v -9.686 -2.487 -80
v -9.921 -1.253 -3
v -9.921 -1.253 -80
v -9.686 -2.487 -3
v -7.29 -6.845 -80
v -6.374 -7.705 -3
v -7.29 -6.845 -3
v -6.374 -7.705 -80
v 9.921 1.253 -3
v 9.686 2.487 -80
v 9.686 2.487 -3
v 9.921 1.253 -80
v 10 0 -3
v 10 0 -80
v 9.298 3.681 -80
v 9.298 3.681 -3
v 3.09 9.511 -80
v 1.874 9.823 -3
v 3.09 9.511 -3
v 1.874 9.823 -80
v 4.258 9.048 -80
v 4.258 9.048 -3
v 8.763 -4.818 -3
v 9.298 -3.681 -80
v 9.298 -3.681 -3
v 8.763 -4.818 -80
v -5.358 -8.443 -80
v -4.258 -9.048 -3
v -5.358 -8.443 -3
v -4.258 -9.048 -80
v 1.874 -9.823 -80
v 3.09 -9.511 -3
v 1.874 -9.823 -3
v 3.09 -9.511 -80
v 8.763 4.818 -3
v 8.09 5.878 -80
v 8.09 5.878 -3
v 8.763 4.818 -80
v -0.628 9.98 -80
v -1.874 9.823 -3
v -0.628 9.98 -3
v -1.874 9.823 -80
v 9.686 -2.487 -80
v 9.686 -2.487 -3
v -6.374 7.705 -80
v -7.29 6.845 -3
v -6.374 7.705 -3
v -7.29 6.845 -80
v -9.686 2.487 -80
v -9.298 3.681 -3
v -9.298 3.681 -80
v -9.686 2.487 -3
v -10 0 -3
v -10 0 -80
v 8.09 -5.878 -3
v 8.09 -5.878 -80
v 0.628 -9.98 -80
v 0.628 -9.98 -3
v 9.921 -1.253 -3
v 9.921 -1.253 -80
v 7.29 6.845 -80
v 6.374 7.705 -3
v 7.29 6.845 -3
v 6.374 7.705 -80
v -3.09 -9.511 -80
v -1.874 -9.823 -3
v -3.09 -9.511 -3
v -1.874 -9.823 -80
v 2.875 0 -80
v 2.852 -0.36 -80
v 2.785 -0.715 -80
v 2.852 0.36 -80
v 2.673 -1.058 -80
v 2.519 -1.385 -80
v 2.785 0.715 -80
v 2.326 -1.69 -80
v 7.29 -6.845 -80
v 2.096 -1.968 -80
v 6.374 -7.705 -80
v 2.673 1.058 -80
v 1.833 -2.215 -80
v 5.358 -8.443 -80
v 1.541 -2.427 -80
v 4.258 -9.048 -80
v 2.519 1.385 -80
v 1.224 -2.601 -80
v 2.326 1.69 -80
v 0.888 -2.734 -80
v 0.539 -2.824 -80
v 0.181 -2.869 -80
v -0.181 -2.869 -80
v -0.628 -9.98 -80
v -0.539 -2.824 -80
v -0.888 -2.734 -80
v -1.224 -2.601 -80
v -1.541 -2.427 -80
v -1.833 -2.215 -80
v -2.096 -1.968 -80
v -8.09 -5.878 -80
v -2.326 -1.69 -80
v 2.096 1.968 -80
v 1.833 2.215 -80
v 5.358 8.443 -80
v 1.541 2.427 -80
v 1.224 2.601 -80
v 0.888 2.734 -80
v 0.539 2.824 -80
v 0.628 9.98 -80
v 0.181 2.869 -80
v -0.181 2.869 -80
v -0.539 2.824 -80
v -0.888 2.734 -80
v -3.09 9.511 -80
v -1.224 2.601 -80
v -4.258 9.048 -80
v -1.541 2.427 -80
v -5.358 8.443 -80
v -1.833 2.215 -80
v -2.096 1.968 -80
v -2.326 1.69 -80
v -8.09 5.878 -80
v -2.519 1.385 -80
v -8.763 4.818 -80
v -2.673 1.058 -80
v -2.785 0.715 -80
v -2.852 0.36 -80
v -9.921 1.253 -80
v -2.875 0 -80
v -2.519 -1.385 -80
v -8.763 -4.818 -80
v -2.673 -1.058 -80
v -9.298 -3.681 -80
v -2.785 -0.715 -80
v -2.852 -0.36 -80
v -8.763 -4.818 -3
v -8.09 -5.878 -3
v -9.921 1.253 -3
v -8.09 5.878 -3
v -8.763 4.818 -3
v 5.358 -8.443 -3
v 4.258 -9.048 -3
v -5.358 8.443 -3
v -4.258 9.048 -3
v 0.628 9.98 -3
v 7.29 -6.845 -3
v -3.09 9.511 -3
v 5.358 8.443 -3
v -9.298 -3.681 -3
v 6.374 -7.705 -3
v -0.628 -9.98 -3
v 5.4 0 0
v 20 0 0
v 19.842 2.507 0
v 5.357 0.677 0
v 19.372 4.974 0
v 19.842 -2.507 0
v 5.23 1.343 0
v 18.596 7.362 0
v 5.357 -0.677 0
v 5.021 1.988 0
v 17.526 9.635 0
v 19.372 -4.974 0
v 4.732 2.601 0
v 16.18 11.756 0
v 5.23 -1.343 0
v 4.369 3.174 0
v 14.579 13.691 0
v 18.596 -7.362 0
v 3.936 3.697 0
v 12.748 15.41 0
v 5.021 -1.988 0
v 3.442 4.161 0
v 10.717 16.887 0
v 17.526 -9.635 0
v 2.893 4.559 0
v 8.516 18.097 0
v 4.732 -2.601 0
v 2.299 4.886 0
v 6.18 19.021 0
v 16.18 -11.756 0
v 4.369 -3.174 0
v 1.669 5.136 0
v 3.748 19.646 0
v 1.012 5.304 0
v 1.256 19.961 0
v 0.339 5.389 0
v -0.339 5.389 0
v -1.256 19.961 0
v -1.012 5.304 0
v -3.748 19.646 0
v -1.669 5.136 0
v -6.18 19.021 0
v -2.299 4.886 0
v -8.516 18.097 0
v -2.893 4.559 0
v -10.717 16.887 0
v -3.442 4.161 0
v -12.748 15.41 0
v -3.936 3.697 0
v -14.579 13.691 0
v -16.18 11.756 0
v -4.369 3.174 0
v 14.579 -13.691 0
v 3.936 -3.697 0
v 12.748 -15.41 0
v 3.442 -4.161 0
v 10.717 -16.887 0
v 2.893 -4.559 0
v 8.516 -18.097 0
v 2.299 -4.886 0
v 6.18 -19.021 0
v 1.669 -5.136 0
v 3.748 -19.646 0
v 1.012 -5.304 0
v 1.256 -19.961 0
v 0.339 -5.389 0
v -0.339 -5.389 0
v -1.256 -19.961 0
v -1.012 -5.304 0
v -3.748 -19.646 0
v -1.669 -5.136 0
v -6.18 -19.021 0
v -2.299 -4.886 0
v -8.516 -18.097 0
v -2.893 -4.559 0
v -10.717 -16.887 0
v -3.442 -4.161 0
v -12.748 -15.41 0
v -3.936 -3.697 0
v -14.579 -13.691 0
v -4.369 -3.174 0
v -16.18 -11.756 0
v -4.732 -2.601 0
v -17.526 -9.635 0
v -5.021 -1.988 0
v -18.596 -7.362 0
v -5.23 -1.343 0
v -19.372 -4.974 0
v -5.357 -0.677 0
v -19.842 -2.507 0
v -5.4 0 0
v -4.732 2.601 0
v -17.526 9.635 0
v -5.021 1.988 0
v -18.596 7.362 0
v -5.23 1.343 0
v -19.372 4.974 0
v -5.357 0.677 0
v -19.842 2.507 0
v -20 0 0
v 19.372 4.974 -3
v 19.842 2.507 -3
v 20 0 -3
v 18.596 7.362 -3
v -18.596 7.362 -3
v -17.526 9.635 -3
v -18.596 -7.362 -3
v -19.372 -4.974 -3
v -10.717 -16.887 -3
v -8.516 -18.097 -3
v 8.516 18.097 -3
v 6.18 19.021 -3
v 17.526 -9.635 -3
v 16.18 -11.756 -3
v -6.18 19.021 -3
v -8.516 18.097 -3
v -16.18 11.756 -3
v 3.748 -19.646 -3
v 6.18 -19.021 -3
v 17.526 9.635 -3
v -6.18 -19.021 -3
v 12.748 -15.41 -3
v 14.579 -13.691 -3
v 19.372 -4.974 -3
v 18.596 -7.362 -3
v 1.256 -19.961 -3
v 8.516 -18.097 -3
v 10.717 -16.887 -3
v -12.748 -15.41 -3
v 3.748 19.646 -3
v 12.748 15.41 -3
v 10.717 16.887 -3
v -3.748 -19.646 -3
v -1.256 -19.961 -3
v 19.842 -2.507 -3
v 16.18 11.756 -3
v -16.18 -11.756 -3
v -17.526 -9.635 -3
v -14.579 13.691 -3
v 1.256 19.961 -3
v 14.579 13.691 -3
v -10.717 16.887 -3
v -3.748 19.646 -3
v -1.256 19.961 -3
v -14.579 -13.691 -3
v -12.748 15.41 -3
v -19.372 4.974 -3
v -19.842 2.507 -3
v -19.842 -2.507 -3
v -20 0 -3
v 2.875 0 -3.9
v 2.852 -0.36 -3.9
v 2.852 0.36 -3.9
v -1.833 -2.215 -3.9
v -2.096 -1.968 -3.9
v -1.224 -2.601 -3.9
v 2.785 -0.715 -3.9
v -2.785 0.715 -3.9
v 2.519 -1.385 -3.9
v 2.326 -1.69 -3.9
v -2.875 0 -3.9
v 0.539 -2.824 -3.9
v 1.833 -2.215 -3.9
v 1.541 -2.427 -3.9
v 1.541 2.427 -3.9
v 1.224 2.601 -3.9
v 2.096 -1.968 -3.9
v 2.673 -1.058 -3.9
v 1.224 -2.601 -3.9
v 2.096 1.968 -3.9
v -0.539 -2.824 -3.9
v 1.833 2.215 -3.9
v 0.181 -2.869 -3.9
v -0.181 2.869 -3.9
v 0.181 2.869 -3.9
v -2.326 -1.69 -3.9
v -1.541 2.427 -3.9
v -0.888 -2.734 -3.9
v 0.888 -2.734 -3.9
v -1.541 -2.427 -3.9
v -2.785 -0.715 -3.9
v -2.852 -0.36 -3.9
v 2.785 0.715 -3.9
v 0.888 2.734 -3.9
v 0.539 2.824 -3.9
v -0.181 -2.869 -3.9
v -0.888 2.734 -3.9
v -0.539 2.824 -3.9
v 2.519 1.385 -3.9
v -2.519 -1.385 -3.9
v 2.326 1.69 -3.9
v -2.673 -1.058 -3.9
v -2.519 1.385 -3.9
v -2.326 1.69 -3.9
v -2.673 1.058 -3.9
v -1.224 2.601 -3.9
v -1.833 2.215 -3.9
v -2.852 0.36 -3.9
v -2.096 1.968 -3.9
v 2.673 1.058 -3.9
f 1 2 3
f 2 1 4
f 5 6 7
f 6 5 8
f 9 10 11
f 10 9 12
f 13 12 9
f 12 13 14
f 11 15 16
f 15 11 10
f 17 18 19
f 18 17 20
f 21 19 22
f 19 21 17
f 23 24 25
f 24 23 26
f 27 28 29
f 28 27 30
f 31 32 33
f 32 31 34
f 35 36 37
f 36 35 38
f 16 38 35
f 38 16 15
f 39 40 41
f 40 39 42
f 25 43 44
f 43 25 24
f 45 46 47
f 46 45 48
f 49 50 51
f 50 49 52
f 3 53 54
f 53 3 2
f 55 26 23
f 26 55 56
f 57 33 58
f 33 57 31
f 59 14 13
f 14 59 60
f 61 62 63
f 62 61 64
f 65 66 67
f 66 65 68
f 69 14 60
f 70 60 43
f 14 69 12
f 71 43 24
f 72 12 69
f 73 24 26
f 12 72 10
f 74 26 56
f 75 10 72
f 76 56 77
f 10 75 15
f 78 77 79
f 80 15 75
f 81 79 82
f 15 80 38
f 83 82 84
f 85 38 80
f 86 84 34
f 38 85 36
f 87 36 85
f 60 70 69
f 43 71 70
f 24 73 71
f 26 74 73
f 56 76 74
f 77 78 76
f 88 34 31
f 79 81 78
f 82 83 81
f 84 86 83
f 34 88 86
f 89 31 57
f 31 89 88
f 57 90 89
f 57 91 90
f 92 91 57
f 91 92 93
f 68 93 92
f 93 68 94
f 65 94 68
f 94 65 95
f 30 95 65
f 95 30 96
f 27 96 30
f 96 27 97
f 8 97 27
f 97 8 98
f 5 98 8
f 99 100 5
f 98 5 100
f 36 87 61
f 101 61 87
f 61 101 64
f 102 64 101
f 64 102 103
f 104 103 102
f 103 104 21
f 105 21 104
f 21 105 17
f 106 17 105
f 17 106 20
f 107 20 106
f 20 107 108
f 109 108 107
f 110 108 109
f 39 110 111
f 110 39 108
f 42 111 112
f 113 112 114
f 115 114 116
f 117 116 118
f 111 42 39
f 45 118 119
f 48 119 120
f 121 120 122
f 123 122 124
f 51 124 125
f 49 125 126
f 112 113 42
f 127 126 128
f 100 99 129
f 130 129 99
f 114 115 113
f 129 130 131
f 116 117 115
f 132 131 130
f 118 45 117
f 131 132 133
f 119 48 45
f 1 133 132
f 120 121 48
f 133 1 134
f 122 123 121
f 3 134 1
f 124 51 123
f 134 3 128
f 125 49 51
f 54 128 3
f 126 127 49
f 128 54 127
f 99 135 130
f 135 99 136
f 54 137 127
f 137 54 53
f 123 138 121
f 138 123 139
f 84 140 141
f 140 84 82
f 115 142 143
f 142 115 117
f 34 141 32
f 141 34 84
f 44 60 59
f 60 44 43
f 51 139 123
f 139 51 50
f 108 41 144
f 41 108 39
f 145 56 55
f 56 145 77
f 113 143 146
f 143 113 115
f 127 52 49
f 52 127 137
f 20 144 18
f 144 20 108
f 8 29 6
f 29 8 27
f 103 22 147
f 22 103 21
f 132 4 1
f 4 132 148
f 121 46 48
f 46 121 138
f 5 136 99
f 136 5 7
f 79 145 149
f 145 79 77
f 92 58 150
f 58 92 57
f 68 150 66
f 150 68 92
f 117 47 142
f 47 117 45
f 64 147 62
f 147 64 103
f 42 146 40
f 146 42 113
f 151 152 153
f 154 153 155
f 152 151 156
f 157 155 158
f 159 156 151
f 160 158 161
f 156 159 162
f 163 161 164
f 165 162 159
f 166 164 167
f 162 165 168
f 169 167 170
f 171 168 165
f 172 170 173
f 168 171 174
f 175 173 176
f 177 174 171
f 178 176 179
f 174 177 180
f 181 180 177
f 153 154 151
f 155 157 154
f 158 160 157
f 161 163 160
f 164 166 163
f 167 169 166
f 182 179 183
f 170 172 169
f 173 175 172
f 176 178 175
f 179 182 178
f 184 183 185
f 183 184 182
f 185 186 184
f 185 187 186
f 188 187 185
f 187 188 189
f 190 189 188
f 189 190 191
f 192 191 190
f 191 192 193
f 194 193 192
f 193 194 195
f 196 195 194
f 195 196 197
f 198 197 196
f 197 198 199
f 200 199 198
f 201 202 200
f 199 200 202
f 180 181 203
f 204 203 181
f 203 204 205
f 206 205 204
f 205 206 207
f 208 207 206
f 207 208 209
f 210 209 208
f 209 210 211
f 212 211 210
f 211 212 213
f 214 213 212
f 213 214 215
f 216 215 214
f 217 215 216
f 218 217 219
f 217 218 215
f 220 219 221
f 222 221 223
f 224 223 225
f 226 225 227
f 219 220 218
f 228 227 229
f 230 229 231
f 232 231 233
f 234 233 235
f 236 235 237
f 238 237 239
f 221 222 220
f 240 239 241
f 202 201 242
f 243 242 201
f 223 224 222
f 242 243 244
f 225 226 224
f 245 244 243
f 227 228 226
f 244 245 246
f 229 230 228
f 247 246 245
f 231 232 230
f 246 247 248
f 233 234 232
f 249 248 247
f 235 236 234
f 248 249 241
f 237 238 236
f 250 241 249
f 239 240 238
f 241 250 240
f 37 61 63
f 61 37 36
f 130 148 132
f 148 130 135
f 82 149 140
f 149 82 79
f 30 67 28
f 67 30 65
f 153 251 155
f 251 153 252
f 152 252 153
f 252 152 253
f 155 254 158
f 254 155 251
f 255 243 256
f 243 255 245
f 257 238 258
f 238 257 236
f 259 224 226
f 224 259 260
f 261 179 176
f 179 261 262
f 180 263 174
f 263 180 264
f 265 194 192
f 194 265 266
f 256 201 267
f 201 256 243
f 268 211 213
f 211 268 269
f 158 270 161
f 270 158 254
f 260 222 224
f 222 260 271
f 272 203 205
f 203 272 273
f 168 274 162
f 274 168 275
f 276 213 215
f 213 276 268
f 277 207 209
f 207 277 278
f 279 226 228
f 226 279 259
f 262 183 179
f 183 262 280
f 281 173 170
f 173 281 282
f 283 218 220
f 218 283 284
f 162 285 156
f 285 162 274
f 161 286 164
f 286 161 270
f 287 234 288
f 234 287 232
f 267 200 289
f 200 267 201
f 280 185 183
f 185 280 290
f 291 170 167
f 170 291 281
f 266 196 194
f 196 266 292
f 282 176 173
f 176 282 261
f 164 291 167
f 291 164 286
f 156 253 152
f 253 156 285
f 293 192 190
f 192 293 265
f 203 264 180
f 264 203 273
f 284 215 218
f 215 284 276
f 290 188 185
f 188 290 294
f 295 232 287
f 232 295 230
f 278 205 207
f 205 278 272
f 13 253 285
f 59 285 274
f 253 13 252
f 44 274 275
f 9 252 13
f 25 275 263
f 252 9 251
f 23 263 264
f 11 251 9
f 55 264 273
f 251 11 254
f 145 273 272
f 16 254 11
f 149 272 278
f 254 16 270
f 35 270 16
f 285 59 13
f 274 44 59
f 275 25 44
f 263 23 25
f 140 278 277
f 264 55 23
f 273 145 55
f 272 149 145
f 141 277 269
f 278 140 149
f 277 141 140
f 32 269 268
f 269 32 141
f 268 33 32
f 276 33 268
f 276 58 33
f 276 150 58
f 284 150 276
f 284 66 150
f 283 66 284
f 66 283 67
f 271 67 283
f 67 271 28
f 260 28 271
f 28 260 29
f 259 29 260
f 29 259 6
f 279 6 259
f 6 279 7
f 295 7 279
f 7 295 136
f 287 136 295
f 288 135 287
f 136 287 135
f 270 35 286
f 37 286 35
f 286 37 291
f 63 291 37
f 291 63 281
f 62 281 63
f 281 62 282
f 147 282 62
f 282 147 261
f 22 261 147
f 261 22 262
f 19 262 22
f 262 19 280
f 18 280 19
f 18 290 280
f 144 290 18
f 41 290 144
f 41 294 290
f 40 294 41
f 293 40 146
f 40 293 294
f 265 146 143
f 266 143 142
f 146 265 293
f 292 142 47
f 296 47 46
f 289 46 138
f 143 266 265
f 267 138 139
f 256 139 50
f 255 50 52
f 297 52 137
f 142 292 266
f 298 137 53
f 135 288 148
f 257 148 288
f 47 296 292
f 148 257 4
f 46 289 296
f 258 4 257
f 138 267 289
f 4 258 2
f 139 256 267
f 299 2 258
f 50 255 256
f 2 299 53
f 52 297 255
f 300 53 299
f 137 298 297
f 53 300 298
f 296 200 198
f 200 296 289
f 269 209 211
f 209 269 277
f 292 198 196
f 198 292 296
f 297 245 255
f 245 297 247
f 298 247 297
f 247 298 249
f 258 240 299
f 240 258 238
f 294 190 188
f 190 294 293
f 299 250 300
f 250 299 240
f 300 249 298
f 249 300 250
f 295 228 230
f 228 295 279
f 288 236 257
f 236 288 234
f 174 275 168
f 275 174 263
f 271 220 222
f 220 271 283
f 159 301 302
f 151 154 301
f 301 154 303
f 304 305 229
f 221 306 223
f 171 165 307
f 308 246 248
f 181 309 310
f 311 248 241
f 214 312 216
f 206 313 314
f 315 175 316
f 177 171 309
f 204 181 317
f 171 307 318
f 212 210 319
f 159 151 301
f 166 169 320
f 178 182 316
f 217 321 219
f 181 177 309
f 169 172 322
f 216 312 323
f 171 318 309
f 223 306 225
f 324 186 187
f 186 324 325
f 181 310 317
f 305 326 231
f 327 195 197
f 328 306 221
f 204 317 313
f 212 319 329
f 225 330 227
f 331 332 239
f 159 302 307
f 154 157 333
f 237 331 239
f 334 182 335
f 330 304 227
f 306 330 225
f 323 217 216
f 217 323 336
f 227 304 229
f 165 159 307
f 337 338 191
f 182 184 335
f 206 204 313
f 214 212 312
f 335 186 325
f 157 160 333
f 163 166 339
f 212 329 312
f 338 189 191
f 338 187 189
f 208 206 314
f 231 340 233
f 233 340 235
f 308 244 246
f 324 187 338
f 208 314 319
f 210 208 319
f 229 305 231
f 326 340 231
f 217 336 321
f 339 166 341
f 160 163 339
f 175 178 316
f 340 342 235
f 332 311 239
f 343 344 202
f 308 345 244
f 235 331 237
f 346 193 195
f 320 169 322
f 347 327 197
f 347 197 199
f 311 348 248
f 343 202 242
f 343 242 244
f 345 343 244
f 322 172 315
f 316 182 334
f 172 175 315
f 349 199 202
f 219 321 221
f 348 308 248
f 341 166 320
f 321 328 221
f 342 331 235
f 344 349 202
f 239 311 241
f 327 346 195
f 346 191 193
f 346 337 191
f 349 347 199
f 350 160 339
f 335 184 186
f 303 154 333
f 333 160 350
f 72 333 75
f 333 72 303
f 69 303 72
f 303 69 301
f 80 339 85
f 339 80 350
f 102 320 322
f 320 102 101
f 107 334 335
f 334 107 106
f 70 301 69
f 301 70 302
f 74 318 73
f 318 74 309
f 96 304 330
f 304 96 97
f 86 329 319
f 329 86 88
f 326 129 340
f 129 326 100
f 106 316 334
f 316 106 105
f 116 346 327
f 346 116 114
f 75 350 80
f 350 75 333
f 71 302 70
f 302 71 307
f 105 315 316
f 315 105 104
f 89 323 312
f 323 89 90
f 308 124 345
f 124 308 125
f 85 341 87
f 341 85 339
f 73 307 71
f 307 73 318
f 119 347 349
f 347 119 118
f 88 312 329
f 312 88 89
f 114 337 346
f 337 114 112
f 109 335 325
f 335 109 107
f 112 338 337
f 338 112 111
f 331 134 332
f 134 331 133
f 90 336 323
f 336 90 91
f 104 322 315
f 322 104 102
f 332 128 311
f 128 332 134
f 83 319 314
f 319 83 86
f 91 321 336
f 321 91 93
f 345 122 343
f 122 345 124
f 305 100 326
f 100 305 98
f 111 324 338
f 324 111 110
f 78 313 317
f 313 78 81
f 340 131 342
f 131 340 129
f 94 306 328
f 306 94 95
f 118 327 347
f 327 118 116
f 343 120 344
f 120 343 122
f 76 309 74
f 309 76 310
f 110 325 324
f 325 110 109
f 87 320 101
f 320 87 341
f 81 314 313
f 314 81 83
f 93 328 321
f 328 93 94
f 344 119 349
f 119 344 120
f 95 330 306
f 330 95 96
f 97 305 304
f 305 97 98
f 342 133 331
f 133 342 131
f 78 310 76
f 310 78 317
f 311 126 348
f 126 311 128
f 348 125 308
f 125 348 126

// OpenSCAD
$fn = 50;


difference() {
	union() {
		translate(v = [0, 0, -80.0000000000]) {
			cylinder(h = 80, r = 10.0000000000);
		}
		translate(v = [0, 0, -3.0000000000]) {
			cylinder(h = 3, r = 20.0000000000);
		}
	}
	union() {
		translate(v = [0, 0, 0]) {
			rotate(a = [0, 0, 0]) {
				difference() {
					union() {
						#translate(v = [0, 0, -80.0000000000]) {
							cylinder(h = 80, r = 2.6000000000);
						}
						#translate(v = [0, 0, -3.9000000000]) {
							cylinder(h = 3.9000000000, r1 = 2.8750000000, r2 = 5.4000000000);
						}
						#translate(v = [0, 0, -80.0000000000]) {
							cylinder(h = 80, r = 2.8750000000);
						}
						#translate(v = [0, 0, -80.0000000000]) {
							cylinder(h = 80, r = 2.6000000000);
						}
					}
					union();
				}
			}
		}
	}
}
